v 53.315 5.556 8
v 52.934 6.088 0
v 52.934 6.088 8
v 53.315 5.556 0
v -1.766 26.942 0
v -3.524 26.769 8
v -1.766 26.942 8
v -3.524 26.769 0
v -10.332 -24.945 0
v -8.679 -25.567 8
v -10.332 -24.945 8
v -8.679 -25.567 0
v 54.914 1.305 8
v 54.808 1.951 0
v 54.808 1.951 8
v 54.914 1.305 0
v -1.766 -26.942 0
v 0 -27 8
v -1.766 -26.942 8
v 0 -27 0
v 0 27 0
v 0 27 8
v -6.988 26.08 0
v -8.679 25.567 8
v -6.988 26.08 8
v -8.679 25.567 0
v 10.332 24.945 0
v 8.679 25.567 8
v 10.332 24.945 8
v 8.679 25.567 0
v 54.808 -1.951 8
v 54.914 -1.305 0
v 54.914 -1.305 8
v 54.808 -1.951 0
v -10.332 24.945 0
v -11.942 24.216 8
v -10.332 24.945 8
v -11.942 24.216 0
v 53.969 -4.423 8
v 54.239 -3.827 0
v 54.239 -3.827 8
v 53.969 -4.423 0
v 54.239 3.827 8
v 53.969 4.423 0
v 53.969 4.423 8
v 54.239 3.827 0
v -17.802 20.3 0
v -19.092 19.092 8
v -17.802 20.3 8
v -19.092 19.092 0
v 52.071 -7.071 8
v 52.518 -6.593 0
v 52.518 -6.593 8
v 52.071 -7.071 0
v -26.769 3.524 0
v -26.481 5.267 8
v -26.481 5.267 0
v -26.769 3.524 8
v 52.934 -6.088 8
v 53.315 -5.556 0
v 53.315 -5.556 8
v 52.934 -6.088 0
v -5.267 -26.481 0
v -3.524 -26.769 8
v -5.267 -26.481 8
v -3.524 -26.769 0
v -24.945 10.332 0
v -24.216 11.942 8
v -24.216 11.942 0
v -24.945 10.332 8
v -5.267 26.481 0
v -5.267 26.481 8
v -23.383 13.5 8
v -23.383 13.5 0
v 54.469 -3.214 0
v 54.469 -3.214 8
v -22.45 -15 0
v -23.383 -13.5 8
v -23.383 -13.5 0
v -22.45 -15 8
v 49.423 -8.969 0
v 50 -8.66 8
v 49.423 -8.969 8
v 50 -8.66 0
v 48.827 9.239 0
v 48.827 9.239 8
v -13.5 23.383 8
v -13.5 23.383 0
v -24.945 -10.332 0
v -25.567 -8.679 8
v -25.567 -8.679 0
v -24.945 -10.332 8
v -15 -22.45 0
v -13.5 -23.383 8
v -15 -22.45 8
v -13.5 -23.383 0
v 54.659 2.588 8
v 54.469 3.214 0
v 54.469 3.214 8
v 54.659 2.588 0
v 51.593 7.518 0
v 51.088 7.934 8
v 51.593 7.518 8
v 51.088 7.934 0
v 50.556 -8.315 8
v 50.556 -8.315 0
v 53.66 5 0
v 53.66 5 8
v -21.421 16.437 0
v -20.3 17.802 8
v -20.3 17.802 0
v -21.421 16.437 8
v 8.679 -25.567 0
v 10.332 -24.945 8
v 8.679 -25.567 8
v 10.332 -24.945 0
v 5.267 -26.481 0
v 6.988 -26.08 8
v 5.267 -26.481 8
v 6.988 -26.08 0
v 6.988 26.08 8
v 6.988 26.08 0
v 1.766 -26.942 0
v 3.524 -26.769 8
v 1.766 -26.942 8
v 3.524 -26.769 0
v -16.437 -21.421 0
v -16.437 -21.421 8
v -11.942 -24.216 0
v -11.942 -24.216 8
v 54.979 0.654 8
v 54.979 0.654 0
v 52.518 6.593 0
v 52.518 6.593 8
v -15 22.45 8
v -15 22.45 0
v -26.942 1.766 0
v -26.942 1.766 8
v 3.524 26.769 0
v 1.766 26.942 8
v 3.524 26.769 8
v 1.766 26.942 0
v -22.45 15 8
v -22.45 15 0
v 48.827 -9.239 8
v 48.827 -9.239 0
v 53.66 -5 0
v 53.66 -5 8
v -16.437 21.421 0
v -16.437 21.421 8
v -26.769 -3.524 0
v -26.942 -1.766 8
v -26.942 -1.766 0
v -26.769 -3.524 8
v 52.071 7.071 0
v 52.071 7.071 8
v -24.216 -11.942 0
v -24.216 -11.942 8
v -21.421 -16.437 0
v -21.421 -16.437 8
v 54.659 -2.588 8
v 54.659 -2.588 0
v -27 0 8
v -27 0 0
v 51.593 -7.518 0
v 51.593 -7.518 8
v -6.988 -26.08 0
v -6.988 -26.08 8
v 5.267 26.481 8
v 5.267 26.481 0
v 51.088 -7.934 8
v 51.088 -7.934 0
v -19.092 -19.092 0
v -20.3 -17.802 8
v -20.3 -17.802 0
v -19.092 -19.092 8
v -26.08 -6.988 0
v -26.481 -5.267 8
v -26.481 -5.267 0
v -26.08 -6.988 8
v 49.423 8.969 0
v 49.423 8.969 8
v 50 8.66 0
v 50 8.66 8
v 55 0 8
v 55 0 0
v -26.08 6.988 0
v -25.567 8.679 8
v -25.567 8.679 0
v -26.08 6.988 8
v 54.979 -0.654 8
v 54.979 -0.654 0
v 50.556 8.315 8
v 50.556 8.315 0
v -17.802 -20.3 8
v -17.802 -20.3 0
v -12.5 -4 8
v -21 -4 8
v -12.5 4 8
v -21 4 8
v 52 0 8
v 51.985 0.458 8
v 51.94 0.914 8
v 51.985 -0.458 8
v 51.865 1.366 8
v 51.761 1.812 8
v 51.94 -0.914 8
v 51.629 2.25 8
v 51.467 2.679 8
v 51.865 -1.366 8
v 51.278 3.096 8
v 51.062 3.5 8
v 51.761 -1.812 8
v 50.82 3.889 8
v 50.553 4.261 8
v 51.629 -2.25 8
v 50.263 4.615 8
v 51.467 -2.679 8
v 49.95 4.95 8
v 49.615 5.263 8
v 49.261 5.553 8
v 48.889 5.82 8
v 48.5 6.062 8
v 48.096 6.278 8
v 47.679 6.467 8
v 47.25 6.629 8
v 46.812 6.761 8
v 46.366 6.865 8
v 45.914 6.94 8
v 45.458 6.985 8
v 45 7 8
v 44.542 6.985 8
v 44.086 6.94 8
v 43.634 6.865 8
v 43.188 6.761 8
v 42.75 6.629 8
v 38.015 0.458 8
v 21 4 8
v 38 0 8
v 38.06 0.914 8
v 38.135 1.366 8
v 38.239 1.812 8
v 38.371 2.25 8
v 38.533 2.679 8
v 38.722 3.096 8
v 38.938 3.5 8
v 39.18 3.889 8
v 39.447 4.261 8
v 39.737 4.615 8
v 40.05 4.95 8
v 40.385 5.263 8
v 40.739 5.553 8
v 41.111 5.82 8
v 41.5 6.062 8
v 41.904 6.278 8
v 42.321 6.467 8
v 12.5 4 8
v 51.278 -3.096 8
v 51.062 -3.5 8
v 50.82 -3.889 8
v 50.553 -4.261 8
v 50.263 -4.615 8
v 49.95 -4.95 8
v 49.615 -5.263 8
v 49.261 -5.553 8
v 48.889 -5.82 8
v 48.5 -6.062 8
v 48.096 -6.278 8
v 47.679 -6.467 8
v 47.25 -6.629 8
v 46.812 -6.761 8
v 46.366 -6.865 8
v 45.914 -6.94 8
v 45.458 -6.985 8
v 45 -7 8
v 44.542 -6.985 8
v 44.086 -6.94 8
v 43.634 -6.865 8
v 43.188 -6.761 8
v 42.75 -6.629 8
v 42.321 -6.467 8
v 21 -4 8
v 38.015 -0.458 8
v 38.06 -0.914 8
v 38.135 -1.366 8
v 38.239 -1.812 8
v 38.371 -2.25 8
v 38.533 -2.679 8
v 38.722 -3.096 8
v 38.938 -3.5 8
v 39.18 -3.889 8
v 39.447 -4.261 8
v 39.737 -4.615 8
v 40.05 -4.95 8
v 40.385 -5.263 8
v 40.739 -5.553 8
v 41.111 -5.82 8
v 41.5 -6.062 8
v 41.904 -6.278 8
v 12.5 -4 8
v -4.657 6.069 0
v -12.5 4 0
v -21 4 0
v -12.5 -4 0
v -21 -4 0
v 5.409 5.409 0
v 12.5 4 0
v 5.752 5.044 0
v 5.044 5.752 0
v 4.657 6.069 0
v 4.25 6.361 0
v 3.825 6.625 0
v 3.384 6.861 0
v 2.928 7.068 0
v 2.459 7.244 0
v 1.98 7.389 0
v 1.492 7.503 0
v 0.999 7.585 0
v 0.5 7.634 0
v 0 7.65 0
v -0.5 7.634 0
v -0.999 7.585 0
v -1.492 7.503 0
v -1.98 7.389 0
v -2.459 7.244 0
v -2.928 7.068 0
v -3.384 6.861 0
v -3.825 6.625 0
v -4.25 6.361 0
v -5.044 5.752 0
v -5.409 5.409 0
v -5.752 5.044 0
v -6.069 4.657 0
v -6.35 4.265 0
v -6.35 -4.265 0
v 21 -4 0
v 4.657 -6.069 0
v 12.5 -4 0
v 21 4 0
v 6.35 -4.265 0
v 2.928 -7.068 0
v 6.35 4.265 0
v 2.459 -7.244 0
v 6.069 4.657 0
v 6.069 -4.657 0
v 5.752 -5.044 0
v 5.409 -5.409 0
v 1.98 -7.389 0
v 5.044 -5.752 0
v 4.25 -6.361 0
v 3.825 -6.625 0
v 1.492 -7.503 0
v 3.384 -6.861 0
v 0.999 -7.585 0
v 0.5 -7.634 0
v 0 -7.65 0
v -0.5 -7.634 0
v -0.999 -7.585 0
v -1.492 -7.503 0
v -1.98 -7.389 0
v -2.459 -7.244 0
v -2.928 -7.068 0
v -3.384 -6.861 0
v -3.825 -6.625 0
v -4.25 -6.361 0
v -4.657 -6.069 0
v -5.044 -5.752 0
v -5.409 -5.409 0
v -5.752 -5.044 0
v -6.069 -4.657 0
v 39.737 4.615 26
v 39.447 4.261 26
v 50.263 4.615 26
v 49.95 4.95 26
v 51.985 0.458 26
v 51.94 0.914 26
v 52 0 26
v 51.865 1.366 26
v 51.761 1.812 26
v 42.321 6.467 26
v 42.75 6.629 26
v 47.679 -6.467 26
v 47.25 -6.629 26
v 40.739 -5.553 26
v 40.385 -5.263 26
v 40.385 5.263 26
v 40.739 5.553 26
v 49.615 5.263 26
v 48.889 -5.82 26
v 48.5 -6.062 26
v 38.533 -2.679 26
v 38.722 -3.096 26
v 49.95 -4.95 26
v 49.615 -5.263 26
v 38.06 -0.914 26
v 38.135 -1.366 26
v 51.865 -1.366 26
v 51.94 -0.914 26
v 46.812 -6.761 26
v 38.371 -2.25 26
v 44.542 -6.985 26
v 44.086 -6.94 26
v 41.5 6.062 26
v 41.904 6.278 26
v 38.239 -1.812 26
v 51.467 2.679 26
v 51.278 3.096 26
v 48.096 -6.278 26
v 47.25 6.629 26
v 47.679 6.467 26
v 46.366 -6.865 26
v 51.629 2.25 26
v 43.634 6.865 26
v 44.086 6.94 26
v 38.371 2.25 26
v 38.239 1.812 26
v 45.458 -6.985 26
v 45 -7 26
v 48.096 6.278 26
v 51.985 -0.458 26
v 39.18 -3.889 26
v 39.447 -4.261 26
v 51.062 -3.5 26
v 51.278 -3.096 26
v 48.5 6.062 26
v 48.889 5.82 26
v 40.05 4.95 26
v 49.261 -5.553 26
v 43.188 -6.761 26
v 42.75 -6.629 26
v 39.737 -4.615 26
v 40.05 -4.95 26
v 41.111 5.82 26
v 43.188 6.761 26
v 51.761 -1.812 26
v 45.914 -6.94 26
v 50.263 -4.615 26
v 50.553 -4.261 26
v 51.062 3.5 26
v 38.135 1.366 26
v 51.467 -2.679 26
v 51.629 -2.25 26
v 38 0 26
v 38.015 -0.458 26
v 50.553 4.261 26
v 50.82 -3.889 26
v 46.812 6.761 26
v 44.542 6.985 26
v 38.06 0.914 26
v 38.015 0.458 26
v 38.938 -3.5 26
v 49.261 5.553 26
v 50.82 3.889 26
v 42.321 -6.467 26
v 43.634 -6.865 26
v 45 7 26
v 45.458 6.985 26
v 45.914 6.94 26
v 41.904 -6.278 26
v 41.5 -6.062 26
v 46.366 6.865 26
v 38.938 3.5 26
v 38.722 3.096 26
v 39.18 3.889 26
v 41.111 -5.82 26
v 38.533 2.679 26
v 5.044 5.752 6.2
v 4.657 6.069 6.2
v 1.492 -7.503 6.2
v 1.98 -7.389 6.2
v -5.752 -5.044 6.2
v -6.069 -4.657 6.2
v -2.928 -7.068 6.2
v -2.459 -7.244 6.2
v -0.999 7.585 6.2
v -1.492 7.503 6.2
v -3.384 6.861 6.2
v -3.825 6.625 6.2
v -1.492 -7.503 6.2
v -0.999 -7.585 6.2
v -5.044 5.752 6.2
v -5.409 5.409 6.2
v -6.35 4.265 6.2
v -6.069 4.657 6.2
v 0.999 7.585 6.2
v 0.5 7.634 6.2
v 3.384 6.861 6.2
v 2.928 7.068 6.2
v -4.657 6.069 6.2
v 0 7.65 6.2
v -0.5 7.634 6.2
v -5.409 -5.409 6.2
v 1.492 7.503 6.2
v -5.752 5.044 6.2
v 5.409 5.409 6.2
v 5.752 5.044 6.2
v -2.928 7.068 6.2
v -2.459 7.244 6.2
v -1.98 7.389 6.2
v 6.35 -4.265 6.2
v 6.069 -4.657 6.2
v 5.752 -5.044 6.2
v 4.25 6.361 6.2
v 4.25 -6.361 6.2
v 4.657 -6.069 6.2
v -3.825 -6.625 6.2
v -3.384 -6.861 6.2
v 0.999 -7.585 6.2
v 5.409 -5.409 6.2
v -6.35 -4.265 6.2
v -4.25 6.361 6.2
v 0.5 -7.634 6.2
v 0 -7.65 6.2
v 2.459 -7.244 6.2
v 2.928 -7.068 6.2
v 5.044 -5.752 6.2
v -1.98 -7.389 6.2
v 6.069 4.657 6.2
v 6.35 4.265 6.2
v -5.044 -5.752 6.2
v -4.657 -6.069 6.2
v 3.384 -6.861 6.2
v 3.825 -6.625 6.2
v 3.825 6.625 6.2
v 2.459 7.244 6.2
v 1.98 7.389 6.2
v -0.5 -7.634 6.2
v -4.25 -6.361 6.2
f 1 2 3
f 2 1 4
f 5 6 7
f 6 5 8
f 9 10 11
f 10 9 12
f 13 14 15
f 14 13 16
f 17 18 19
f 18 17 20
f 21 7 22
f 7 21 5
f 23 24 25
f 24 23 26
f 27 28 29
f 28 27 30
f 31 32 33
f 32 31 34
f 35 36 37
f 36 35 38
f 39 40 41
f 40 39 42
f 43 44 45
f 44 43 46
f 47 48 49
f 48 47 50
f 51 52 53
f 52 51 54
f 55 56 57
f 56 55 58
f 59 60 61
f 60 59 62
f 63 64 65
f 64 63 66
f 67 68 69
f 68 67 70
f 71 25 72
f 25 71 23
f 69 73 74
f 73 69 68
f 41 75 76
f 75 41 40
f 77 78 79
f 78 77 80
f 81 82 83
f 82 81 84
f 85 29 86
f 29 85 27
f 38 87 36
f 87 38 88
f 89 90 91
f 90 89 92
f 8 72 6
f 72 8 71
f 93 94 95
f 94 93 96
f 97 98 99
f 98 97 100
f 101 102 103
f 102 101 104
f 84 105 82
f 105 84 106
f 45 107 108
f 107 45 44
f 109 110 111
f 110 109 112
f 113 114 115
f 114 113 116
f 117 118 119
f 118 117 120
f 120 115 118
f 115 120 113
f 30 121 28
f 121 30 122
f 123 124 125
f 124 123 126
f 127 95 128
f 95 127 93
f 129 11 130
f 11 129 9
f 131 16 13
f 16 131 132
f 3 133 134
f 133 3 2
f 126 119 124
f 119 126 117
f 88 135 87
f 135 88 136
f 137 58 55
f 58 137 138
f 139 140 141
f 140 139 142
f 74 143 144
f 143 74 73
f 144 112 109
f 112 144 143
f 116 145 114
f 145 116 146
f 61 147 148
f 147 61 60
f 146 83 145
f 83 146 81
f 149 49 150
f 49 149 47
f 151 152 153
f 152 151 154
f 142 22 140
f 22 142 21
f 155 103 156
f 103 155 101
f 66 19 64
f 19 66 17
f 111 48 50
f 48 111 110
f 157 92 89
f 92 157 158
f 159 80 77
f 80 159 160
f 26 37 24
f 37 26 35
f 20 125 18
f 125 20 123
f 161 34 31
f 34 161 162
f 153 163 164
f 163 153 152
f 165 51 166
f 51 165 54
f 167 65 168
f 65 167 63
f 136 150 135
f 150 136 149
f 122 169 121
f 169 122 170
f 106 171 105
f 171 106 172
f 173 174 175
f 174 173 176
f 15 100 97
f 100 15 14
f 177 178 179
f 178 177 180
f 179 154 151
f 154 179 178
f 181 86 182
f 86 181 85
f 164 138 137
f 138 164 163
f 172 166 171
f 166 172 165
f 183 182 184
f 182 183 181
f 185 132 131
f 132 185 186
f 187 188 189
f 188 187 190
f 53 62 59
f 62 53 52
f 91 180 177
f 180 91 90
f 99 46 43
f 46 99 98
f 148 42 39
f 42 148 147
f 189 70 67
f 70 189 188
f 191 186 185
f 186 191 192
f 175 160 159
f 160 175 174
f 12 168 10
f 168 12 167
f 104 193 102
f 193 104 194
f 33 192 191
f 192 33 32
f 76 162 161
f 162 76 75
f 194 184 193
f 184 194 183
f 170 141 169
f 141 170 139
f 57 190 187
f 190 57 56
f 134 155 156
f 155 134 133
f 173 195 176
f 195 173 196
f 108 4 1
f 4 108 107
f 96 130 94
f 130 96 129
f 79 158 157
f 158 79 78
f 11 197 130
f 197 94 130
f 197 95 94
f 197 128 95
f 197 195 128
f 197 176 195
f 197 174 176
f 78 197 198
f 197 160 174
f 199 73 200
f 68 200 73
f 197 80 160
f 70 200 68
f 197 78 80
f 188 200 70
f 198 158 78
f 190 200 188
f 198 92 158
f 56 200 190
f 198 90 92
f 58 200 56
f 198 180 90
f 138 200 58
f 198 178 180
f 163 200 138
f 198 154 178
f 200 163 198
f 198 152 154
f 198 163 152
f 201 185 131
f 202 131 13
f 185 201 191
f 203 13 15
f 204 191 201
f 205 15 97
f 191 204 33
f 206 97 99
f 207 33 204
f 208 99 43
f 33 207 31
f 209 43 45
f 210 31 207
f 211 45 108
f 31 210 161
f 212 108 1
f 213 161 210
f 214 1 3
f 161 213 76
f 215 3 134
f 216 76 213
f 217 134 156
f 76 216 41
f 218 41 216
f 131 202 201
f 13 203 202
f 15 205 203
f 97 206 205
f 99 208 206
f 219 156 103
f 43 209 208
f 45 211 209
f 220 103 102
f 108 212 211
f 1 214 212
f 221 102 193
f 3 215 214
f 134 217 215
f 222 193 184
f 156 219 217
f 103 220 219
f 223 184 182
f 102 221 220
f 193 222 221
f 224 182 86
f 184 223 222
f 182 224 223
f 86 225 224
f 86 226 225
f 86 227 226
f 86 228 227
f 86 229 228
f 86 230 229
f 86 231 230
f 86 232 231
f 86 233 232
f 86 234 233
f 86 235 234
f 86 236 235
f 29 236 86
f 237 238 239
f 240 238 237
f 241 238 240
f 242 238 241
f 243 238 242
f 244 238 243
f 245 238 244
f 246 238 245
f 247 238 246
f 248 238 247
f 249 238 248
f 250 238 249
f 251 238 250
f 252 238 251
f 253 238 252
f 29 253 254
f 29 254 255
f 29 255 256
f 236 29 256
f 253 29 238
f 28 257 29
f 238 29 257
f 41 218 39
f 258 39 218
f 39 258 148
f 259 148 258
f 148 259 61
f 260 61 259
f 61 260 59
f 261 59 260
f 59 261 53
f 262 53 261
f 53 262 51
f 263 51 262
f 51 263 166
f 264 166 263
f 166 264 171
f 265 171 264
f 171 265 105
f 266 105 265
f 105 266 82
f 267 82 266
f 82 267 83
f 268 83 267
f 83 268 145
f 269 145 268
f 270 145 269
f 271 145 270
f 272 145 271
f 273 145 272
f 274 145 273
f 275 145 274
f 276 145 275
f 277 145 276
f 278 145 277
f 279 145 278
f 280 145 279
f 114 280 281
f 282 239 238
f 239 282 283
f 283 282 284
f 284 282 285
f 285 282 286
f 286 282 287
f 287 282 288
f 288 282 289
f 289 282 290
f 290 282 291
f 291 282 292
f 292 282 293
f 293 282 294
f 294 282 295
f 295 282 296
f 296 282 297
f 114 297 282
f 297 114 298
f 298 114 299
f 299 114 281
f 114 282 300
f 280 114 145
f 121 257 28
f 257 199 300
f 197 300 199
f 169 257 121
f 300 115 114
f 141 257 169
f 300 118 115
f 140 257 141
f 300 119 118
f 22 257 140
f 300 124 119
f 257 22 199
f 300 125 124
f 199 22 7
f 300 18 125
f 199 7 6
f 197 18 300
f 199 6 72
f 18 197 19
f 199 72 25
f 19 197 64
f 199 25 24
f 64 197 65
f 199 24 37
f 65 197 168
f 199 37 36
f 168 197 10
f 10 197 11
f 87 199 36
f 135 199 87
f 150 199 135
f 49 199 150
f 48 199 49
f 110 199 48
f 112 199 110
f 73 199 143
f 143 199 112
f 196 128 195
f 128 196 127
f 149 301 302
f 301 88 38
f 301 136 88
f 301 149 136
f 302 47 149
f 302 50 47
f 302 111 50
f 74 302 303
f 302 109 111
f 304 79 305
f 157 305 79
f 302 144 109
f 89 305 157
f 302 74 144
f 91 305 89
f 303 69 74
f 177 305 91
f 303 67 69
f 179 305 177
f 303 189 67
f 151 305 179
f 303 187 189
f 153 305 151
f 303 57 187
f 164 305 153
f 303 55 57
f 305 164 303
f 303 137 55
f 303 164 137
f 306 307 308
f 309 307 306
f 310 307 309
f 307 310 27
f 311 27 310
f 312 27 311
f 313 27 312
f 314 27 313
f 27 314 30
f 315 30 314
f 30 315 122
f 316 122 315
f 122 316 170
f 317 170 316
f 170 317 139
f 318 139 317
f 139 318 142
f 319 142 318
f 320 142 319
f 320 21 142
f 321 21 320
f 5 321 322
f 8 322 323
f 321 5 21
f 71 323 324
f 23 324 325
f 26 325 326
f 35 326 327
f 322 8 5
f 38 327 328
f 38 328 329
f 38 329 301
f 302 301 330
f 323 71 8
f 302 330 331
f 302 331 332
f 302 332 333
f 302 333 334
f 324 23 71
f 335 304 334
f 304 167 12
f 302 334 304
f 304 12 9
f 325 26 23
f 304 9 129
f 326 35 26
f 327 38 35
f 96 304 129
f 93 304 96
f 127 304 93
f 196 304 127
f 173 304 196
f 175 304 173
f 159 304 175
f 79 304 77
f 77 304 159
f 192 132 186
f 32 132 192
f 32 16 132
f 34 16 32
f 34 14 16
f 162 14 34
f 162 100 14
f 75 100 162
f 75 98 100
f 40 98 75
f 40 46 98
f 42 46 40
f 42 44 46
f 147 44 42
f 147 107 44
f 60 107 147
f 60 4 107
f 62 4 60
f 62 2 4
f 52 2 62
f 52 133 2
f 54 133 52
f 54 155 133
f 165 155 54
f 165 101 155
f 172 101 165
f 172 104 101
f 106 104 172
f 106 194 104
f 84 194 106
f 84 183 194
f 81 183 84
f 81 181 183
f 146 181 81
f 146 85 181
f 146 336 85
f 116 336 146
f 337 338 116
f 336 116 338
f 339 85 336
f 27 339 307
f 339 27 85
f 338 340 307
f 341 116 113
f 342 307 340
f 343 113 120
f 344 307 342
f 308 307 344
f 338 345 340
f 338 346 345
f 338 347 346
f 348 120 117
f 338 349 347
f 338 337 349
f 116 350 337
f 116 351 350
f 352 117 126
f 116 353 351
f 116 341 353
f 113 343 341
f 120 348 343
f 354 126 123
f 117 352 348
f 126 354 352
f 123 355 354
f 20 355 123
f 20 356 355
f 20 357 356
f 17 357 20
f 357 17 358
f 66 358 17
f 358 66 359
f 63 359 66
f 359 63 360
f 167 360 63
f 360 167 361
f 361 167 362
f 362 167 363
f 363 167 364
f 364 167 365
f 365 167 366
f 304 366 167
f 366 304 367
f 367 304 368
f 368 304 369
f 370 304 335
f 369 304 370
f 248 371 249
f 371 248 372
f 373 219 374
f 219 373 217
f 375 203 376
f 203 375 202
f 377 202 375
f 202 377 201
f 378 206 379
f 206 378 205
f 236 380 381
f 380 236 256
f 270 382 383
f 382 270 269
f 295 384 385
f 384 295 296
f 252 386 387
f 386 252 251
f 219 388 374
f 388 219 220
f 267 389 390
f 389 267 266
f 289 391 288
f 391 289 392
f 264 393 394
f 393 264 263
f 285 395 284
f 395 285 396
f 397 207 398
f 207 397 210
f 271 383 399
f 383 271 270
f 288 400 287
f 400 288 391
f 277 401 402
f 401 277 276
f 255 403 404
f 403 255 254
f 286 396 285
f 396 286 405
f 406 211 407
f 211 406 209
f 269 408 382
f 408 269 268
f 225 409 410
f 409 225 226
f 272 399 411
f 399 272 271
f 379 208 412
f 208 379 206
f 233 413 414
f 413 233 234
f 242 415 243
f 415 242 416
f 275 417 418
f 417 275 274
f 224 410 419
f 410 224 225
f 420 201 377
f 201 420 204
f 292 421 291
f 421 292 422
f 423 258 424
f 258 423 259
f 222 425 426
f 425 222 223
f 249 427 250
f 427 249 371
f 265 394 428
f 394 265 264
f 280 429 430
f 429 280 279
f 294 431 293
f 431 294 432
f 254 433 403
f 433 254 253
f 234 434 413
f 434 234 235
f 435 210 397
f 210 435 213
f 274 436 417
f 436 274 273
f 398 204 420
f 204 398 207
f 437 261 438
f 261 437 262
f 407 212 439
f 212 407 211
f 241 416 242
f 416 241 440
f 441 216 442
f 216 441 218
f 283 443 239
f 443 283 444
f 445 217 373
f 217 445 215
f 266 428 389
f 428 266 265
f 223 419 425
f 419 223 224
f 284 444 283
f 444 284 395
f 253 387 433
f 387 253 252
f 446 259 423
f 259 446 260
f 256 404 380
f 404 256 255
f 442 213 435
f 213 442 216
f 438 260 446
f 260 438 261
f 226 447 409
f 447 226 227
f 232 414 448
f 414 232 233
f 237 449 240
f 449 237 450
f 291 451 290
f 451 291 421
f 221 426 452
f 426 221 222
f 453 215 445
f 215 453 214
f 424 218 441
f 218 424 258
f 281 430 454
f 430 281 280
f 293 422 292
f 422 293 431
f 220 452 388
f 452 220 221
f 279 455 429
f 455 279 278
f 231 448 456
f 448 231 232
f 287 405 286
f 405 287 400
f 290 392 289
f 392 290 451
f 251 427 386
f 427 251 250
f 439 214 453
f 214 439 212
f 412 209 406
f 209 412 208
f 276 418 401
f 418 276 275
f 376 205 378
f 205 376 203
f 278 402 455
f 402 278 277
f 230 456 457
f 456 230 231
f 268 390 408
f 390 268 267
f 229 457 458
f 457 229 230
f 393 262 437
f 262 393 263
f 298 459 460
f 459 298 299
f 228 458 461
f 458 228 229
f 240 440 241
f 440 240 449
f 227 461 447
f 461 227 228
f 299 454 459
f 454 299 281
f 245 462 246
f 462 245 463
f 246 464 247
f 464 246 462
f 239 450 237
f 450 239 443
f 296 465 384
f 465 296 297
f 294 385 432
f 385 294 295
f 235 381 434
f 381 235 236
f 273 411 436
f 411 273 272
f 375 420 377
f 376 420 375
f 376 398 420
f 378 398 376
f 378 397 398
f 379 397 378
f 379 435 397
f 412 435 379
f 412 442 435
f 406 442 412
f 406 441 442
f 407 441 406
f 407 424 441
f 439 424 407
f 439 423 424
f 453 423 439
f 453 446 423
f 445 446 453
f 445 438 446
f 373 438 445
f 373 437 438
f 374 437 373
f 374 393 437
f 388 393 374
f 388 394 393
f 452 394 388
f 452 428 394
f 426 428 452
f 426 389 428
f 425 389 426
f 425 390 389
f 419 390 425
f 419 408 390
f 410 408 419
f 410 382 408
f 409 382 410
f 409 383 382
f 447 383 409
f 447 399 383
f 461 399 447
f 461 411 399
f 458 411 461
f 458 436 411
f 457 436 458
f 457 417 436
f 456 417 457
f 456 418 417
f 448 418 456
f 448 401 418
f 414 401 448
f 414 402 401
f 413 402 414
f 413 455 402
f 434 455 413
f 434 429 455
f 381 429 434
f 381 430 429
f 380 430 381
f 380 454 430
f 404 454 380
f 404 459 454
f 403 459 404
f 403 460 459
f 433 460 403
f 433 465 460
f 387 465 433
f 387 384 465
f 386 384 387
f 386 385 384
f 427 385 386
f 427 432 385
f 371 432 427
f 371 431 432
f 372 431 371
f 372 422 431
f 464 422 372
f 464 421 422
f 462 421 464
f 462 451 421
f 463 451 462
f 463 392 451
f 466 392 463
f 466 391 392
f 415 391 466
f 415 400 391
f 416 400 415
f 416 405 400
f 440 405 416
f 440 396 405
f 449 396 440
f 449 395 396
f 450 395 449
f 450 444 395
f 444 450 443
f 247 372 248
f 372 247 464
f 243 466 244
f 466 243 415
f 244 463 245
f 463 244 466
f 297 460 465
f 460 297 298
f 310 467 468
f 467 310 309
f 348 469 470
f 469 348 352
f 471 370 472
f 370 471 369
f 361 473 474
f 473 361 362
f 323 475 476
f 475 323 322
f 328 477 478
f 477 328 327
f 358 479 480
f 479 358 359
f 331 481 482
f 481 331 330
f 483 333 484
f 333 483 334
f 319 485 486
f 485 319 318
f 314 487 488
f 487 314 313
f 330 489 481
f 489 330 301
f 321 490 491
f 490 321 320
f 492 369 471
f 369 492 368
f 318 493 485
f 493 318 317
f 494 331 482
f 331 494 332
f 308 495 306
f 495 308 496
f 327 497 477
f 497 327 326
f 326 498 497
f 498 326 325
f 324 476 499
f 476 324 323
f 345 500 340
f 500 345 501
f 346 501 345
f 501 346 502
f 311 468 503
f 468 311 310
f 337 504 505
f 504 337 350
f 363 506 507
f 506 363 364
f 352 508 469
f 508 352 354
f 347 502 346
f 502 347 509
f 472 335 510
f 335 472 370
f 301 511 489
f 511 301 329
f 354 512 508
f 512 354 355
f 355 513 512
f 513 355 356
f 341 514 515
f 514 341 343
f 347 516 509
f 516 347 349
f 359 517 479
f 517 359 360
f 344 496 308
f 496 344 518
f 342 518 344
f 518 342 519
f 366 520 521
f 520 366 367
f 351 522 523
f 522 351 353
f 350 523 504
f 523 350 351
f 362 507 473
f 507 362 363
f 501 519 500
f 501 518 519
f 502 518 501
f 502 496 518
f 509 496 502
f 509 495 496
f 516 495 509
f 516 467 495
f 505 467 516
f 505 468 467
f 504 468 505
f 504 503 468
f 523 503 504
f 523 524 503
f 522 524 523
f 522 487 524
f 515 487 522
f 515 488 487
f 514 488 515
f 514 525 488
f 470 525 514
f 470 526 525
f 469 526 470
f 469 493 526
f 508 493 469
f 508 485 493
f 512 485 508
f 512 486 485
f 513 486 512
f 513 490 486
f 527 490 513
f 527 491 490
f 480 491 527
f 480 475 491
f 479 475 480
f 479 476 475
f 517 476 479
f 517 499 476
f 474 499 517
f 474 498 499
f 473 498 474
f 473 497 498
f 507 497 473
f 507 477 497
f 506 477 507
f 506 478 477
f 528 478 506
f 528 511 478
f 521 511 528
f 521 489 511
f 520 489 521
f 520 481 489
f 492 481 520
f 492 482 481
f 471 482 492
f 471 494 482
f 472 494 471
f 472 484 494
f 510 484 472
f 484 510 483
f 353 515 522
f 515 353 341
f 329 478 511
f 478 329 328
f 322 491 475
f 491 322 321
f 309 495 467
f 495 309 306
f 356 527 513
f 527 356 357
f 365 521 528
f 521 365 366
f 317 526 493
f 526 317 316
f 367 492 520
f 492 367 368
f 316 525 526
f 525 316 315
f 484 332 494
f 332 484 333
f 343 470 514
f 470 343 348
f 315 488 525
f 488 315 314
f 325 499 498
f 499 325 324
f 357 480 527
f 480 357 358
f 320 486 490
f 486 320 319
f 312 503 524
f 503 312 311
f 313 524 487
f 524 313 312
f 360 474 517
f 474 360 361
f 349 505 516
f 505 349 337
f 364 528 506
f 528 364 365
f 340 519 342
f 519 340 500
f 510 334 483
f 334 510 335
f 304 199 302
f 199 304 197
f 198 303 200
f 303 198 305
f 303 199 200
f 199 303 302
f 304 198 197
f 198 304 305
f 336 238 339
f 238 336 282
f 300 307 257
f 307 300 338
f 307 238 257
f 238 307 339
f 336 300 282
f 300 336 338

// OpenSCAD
// respool_crank — drops over the spool's journal and turns it.
//
// Winding 15 m of braid is 126–149 turns. Pinching a ⌀56 flange means
// re-gripping every half turn; this makes it steady winding.
//
// THE SOCKET IS A D, NOT A CIRCLE. The journal carries two flats 12.00 apart
// across a ⌀14.60 body — the flats take the torque so the crank does not rely on
// friction, which printed-on-printed never survives.
//
// IT SITS ON THE FLANGE, NOT ON THE JOURNAL. The ⌀54 disc lands flat on the
// spool's upper flange and the socket is deeper than the journal is tall, so the
// journal never bottoms. See respool_common for why the first one walked off.
//
// PRINT: as emitted, socket mouth DOWN on the bed. The socket's ceiling is a
// ⌀14.60 circle 6.2 mm up — a short bridge that needs no support. The grip
// stands up off the arm and carries itself.
include <respool_common.scad>
$fn = 96;

module _socket() {
    intersection() {
        cylinder(d = CRANK_JOURNAL + 2*CRANK_CLR, h = CRANK_DEPTH + EPS);
        translate([-(CRANK_FLAT_AF + 2*CRANK_CLR)/2, -CRANK_JOURNAL, -EPS])
            cube([CRANK_FLAT_AF + 2*CRANK_CLR, 2*CRANK_JOURNAL, CRANK_DEPTH + 3*EPS]);
    }
}

difference() {
    union() {
        // one hull: the disc IS the hub, so there is no disc-to-arm join at all
        hull() {
            cylinder(d = CRANK_DISC_D, h = CRANK_T);
            translate([CRANK_ARM, 0, 0]) cylinder(d = CRANK_GRIP_D + 6, h = CRANK_T);
        }
        translate([CRANK_ARM, 0, CRANK_T - EPS])
            cylinder(d = CRANK_GRIP_D, h = CRANK_GRIP_H + EPS);
    }
    translate([0, 0, -EPS]) _socket();
    // anchor-tail windows, clean through, both sides
    for (sx = [-1, 1])
        translate([sx > 0 ? CRANK_WIN_R0 : -CRANK_WIN_R1, -CRANK_WIN_W/2, -1])
            cube([CRANK_WIN_R1 - CRANK_WIN_R0, CRANK_WIN_W, CRANK_T + 2]);
}
